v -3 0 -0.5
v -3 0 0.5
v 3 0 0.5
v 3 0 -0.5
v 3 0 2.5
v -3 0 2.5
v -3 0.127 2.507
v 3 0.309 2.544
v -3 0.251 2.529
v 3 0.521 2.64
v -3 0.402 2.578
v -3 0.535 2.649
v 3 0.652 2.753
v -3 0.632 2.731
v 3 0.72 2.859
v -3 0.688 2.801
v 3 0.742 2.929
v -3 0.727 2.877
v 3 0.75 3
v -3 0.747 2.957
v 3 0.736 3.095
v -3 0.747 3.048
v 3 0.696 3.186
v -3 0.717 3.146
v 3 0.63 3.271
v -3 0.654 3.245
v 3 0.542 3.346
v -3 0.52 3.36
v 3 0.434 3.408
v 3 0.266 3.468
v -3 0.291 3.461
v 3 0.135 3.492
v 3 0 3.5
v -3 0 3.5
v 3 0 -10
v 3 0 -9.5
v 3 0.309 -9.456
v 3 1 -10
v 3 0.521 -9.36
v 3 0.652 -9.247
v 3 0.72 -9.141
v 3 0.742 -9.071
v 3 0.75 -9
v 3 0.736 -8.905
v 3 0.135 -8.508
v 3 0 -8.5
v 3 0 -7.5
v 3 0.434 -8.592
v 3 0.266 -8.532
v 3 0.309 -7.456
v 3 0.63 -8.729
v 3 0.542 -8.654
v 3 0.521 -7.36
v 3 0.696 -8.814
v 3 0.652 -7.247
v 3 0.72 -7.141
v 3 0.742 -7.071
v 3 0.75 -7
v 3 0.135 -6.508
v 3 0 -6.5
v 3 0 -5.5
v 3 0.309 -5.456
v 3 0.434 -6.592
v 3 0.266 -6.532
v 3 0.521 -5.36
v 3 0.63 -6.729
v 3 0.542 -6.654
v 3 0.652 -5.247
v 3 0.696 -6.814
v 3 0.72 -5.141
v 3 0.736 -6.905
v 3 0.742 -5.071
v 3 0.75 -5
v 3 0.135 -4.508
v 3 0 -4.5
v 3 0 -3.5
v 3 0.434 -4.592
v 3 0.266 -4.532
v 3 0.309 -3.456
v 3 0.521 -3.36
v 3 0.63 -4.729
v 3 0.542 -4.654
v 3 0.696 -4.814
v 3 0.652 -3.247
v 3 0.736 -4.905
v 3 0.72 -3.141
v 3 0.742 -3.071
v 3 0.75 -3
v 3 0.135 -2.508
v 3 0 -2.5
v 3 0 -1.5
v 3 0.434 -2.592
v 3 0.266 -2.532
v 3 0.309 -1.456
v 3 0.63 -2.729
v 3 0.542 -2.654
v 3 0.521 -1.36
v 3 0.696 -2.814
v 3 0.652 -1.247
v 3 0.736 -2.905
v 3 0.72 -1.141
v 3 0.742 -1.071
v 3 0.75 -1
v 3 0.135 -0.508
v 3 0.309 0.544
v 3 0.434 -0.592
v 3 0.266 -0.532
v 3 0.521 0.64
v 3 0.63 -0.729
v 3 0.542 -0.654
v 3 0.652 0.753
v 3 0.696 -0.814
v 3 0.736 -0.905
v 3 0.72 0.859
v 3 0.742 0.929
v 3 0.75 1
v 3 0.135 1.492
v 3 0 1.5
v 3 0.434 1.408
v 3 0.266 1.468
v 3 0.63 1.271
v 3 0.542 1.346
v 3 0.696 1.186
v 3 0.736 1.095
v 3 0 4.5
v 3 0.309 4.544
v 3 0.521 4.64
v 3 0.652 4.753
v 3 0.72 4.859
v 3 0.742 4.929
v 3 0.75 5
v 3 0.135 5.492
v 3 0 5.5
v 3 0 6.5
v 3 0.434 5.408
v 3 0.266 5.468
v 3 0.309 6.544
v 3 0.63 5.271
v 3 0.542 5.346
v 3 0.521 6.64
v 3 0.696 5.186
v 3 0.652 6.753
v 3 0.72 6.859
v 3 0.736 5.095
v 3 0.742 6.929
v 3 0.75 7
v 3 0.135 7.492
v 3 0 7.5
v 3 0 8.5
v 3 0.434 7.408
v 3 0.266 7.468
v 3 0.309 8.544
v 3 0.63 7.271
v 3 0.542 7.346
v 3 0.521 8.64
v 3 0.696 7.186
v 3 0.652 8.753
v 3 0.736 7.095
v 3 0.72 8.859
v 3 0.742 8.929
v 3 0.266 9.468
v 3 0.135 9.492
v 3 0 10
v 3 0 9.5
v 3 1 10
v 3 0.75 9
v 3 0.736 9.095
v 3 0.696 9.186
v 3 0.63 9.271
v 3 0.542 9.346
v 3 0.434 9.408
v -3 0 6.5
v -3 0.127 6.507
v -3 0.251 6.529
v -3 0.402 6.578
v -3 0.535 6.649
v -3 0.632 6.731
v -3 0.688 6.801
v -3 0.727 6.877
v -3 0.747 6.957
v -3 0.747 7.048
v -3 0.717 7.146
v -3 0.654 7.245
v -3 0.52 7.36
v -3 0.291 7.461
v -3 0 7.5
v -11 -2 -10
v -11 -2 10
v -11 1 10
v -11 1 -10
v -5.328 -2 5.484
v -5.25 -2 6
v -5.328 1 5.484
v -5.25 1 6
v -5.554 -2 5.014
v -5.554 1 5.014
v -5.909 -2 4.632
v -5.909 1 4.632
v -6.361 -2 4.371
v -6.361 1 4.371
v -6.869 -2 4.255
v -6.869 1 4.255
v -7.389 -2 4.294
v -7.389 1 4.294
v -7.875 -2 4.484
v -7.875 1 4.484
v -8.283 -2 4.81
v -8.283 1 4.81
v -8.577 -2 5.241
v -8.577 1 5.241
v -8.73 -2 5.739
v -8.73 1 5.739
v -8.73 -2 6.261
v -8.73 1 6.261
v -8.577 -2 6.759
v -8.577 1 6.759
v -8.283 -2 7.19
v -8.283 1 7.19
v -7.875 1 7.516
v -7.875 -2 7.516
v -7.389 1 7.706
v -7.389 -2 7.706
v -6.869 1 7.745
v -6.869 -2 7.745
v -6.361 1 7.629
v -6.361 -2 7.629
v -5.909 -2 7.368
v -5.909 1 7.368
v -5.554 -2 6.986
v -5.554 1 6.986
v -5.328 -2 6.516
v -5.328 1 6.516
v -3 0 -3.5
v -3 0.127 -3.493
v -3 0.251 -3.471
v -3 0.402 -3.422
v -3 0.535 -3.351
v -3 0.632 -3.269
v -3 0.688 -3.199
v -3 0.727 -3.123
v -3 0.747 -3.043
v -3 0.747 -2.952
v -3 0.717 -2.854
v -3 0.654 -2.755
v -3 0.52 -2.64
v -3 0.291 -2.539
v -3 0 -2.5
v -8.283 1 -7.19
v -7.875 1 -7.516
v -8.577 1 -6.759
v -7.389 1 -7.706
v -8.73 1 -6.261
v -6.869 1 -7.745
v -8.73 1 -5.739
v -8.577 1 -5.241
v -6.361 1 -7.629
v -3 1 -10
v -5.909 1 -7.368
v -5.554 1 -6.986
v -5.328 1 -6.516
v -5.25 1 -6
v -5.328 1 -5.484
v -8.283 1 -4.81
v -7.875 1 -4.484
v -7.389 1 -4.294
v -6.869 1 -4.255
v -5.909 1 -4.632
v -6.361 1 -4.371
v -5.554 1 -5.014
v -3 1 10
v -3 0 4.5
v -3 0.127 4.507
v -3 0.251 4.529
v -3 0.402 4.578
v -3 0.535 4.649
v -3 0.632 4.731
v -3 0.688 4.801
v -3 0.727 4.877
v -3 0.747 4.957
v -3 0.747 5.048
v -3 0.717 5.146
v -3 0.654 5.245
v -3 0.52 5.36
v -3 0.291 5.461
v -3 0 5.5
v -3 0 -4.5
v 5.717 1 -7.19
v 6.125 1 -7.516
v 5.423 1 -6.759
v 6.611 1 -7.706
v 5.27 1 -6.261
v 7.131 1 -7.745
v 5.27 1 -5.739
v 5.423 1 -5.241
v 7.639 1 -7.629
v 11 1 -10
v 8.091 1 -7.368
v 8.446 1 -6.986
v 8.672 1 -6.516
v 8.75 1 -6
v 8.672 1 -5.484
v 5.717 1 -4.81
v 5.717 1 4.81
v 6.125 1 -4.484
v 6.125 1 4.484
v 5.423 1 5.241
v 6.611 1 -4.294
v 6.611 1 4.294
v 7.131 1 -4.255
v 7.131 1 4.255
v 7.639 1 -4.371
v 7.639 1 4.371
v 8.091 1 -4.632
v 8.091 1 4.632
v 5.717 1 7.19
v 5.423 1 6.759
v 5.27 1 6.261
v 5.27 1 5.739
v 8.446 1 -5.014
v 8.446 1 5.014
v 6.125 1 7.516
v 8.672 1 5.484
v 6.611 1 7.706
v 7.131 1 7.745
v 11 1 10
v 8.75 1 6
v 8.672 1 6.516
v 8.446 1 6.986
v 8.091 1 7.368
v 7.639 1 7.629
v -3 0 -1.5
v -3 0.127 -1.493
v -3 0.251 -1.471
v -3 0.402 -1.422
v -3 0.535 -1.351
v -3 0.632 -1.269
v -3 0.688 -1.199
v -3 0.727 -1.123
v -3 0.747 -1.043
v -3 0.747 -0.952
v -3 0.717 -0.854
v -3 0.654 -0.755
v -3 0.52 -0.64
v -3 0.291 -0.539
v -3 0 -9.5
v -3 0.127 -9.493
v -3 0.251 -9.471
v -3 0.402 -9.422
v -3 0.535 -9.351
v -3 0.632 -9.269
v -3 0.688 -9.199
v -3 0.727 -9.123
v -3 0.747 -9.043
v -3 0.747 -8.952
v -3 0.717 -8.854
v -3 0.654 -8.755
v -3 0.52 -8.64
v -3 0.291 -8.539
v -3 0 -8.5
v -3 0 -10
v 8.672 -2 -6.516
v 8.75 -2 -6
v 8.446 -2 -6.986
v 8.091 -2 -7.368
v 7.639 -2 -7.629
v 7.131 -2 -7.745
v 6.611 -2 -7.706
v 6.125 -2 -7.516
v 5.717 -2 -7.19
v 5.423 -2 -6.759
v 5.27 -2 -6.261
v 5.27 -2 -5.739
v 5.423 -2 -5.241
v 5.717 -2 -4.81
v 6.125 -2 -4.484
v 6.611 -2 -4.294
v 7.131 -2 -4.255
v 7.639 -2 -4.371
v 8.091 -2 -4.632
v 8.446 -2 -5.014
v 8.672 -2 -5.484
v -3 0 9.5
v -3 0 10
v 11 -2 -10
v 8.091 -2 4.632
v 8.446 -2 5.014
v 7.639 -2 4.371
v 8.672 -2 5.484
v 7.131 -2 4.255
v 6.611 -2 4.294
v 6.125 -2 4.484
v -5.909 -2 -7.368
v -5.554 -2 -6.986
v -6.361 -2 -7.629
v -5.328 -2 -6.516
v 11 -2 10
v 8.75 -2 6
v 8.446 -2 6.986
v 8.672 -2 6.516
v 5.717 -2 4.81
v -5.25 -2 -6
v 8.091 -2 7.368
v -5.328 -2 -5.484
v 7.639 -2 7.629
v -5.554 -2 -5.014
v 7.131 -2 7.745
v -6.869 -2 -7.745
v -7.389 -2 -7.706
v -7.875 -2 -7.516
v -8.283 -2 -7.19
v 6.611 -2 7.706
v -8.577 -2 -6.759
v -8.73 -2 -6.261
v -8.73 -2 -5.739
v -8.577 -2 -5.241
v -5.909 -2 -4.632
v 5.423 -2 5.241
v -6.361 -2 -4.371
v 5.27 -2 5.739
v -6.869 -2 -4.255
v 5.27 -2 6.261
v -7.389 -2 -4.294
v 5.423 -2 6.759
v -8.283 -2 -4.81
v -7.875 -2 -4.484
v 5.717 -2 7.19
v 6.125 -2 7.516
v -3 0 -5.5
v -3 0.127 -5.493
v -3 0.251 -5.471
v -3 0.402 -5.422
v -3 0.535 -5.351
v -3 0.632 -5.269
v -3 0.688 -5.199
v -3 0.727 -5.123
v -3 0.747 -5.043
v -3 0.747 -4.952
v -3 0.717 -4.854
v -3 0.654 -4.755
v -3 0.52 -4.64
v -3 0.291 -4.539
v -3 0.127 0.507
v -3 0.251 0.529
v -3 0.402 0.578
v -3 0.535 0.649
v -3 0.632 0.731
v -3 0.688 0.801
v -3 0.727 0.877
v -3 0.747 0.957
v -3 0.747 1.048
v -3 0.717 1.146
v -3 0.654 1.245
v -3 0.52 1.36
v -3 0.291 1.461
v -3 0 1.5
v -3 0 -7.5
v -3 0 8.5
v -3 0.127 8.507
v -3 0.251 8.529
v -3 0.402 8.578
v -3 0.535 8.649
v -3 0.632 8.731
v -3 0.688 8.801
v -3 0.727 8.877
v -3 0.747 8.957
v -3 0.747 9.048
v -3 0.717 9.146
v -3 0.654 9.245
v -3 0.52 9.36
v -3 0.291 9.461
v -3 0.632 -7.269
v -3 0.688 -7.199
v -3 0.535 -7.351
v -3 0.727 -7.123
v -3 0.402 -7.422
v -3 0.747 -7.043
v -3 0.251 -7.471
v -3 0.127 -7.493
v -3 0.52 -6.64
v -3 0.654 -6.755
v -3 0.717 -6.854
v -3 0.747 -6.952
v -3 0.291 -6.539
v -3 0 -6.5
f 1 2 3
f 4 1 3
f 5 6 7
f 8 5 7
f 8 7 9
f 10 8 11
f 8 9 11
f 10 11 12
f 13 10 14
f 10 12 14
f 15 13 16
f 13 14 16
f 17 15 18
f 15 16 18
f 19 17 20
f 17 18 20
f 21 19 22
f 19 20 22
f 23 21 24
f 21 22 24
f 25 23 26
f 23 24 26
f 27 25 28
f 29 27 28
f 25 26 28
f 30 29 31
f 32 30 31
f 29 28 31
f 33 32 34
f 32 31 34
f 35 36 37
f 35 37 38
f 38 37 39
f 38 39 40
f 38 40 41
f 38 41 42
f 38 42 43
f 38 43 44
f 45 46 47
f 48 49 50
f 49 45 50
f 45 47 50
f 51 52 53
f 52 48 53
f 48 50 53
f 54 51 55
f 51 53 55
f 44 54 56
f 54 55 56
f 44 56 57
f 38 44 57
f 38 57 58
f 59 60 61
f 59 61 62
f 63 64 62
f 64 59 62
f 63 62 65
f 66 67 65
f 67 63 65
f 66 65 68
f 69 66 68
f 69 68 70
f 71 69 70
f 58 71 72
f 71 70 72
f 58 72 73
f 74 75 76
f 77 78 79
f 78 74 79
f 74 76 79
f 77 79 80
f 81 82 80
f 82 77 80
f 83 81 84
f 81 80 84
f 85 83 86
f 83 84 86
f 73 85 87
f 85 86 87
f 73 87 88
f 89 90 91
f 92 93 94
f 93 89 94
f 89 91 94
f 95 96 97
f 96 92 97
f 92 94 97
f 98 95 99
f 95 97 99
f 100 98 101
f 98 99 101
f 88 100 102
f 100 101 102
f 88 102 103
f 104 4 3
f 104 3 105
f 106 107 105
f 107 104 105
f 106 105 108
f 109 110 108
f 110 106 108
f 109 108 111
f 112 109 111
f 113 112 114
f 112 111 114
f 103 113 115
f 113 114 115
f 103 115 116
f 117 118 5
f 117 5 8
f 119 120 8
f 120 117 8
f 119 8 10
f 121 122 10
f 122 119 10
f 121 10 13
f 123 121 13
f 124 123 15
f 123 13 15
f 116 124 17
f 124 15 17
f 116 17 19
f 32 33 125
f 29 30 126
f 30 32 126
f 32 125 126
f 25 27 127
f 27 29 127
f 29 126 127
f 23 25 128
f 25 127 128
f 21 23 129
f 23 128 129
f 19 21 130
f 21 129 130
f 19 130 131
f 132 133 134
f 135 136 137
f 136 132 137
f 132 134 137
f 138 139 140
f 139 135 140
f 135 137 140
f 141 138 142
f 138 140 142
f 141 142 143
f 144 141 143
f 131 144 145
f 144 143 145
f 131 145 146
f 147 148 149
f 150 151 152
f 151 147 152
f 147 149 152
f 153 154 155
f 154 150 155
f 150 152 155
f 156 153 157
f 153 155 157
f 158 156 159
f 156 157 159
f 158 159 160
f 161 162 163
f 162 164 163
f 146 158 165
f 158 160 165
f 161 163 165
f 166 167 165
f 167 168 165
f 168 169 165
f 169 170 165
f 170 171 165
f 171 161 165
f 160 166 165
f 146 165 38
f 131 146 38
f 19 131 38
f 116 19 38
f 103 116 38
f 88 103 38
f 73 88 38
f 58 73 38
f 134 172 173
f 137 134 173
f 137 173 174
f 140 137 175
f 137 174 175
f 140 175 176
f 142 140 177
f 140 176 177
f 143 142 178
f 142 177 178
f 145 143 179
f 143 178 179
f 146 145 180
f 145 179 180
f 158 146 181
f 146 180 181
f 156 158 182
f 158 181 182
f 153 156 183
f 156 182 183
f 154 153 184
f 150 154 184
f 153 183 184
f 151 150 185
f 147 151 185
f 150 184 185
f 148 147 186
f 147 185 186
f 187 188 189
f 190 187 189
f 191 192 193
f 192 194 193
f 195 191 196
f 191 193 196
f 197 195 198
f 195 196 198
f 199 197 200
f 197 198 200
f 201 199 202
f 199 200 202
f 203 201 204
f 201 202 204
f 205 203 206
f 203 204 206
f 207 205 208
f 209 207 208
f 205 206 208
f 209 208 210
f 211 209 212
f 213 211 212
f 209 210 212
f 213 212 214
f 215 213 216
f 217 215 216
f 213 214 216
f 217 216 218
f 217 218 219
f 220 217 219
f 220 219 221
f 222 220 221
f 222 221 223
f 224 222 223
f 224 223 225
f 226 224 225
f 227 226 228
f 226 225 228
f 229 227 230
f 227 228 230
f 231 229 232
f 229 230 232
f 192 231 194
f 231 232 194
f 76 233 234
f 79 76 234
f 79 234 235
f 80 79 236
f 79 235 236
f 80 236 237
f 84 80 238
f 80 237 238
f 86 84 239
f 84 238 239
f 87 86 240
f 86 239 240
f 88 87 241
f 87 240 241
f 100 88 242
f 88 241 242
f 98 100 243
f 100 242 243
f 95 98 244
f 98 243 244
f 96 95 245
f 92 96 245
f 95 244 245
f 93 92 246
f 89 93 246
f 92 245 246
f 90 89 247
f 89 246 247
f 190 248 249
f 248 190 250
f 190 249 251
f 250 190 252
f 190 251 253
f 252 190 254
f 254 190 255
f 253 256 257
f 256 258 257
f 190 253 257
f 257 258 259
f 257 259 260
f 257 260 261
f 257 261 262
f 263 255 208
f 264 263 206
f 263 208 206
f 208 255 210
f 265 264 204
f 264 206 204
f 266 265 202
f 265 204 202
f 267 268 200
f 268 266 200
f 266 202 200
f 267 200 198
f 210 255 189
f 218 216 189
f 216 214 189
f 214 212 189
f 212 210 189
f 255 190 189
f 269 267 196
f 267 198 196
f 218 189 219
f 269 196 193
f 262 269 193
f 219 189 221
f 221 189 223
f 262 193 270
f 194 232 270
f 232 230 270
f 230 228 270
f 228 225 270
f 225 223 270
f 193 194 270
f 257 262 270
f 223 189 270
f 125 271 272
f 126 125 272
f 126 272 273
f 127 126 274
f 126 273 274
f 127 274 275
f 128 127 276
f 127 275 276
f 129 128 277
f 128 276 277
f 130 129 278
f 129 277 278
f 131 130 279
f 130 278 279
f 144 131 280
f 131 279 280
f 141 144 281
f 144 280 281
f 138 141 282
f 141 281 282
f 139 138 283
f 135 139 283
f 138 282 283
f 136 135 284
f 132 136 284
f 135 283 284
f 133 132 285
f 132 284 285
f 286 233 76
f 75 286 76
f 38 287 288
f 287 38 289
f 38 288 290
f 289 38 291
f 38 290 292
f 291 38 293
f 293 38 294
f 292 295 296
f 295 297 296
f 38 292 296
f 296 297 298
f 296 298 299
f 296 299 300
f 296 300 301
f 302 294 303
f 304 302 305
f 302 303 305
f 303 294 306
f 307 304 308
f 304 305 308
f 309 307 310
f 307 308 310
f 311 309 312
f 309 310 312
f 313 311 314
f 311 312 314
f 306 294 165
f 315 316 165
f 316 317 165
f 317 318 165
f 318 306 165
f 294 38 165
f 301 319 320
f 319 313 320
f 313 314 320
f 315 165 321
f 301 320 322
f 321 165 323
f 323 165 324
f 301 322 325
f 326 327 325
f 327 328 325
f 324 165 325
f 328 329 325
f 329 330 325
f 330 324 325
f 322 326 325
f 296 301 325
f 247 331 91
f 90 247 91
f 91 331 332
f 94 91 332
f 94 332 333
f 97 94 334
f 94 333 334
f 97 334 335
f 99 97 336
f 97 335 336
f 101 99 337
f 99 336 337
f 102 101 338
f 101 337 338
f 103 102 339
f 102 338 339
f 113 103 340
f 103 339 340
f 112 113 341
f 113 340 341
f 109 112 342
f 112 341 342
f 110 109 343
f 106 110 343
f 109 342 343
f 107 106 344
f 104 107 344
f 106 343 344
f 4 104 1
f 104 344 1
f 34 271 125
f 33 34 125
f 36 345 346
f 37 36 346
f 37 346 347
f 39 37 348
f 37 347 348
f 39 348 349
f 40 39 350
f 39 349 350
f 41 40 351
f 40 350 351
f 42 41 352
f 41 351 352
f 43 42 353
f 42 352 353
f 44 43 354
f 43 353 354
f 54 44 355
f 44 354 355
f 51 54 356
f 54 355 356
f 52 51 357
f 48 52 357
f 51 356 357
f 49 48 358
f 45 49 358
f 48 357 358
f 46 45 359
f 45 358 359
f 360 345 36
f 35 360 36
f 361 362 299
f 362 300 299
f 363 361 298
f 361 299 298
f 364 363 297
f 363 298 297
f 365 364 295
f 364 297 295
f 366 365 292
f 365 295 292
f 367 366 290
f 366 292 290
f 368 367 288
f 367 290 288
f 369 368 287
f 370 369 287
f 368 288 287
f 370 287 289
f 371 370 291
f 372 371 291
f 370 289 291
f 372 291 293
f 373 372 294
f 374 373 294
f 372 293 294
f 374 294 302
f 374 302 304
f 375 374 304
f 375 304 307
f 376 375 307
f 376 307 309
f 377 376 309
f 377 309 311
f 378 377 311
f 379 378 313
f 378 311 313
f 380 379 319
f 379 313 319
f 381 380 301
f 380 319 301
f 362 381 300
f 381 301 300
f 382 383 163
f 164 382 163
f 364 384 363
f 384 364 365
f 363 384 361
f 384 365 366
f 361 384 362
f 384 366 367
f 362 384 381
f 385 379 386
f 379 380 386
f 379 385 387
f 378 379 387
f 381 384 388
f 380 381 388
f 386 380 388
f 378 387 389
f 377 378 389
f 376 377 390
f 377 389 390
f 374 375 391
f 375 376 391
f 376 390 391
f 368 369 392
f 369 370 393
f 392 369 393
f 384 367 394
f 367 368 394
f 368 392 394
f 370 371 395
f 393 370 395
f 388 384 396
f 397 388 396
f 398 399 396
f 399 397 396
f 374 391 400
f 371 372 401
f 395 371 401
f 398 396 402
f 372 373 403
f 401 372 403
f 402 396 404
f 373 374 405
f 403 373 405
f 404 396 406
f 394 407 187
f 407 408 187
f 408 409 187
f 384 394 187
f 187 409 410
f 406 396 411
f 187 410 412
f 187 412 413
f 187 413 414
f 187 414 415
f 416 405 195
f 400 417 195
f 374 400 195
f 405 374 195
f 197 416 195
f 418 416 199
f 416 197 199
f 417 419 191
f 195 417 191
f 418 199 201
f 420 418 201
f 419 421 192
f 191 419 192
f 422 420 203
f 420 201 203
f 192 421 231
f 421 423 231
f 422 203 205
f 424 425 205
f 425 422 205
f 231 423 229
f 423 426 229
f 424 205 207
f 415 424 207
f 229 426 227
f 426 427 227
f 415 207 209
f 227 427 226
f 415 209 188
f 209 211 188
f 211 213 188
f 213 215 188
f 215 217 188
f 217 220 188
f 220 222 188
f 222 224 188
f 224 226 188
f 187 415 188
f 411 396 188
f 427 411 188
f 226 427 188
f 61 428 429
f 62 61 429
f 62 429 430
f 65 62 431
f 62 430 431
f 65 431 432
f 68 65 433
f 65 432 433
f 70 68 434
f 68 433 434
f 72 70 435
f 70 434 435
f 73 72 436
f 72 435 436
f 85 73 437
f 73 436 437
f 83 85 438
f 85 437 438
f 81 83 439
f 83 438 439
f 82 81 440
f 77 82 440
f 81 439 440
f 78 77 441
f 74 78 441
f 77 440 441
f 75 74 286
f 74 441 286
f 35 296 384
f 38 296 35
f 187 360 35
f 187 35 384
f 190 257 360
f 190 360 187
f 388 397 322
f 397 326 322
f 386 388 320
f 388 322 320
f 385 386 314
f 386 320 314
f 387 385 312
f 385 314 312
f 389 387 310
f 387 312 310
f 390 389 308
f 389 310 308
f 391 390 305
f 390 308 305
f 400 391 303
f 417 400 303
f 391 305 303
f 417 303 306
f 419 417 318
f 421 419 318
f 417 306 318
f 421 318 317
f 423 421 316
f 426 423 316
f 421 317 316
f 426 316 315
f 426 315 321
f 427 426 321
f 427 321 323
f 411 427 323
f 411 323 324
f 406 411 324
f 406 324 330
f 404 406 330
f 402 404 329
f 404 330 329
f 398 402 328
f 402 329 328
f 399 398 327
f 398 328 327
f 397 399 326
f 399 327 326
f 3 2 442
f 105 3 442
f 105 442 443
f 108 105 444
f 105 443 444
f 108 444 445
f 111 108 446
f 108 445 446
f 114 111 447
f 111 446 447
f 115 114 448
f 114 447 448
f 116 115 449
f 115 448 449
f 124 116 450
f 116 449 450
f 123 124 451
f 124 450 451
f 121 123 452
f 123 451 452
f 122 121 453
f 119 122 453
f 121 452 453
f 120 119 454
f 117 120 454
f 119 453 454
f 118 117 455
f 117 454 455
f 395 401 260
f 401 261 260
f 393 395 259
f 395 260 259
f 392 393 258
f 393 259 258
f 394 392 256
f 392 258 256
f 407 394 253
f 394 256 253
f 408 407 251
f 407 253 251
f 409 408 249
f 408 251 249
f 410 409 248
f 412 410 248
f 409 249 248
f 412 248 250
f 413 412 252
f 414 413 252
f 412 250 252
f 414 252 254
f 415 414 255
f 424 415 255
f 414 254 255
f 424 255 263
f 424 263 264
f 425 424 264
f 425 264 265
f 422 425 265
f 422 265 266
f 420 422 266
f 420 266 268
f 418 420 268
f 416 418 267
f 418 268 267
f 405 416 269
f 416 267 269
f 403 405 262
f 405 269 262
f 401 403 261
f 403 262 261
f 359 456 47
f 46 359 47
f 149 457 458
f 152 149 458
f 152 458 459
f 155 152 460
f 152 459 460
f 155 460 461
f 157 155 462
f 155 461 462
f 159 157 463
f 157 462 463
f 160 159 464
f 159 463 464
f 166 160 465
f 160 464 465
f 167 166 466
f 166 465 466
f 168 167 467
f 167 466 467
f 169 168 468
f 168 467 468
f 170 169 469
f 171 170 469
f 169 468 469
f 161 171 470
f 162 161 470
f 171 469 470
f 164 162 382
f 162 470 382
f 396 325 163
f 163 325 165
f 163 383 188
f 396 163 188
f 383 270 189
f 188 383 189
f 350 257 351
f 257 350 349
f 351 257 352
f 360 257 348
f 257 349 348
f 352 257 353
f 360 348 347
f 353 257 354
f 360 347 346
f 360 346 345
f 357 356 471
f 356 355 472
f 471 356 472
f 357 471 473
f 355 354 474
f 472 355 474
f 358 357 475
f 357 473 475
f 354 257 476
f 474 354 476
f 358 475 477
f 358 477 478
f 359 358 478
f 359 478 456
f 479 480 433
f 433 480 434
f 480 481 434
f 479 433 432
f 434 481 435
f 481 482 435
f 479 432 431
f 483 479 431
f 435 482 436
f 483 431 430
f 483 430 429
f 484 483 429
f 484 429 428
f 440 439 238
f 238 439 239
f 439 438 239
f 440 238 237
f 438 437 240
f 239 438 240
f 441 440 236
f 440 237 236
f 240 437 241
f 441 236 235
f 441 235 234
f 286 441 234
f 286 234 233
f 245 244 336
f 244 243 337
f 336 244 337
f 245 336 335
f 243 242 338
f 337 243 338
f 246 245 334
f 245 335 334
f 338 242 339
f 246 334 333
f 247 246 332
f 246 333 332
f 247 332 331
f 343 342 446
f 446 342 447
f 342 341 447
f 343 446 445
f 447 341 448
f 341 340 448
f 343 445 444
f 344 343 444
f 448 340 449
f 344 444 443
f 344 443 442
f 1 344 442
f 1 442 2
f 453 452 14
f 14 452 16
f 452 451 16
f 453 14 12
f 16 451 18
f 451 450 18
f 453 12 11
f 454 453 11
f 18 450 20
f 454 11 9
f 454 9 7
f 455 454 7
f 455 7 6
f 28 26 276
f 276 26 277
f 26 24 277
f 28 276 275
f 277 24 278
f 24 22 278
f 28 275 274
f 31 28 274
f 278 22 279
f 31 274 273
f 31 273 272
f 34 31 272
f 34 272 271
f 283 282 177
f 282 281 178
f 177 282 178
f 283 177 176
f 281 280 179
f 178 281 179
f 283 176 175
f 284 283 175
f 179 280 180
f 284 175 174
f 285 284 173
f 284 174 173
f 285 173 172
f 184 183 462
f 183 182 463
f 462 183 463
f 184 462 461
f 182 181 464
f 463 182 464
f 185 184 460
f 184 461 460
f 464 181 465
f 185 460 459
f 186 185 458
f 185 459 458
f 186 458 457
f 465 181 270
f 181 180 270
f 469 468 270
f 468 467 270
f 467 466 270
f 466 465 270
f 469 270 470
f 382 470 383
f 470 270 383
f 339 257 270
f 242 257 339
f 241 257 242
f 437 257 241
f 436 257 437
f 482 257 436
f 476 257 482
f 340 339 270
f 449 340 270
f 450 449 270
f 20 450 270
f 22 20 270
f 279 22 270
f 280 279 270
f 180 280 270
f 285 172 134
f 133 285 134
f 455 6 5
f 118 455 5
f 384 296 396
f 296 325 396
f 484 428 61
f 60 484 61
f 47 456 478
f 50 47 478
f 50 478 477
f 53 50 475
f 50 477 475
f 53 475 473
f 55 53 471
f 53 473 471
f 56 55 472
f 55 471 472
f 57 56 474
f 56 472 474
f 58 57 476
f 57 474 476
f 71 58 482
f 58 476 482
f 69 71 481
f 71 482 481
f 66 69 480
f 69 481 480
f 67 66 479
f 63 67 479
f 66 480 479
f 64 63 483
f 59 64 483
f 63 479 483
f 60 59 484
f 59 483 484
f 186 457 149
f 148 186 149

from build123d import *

# Parameters (mm, degrees)
BOSS_EXTRUDE1_DEPTH     = 10
BOSS_EXTRUDE2_START     = -11
SKETCH3_RX              = 0.75
SKETCH3_RY              = 0.5
BOSS_EXTRUDE2_DEPTH     = 14
LPATTERN1_COUNT         = 5
LPATTERN1_PITCH         = 2
LPATTERN1_COL_COUNT     = 6
LPATTERN1_COL_PITCH     = 2
SKETCH4_R               = 1.75
CUT_EXTRUDE2_DEPTH      = 2.0000001
CUT_EXTRUDE2_DEPTH_BACK = 3


with BuildPart() as part:
    # Sketch2 → Boss-Extrude1 (new body, symmetric)
    with BuildSketch(Plane.XY):
        Polygon((-11, 1), (-3, 1), (-3, 0), (3, 0), (3, 1), (11, 1), (11, -2), (-11, -2), align=None)
    extrude(amount=BOSS_EXTRUDE1_DEPTH, both=True)

    # Sketch3 → Boss-Extrude2 (add)
    with BuildSketch(Plane(origin=(0, 0, 0), x_dir=(0, 0, -1), z_dir=(1, 0, 0)).offset(BOSS_EXTRUDE2_START)):
        with Locations(Location((-1, 0), (0, 0, 90))):
            Ellipse(SKETCH3_RX, SKETCH3_RY)
    boss_extrude2 = extrude(amount=BOSS_EXTRUDE2_DEPTH)

    # LPattern1: Boss-Extrude2 ×5
    with Locations(*[(0, 0, i * LPATTERN1_PITCH) for i in range(1, LPATTERN1_COUNT)]):
        add(boss_extrude2)

    # LPattern1 col: Boss-Extrude2 ×6
    with Locations(*[(0, 0, -i * LPATTERN1_COL_PITCH) for i in range(1, LPATTERN1_COL_COUNT)]):
        add(boss_extrude2)

    # Sketch4 → Cut-Extrude2 (cut, two sides)
    with BuildSketch(Plane(origin=(0, 0, 0), x_dir=(1, 0, 0), z_dir=(0, 1, 0))) as cut_extrude2_sk:
        with Locations((-7, 6)):
            Circle(SKETCH4_R)
        with Locations((7, 6)):
            Circle(SKETCH4_R)
        with Locations((7, -6)):
            Circle(SKETCH4_R)
        with Locations((-7, -6)):
            Circle(SKETCH4_R)
    extrude(amount=CUT_EXTRUDE2_DEPTH, mode=Mode.SUBTRACT)
    extrude(cut_extrude2_sk.sketch, amount=-CUT_EXTRUDE2_DEPTH_BACK, mode=Mode.SUBTRACT)


solid = part.part
